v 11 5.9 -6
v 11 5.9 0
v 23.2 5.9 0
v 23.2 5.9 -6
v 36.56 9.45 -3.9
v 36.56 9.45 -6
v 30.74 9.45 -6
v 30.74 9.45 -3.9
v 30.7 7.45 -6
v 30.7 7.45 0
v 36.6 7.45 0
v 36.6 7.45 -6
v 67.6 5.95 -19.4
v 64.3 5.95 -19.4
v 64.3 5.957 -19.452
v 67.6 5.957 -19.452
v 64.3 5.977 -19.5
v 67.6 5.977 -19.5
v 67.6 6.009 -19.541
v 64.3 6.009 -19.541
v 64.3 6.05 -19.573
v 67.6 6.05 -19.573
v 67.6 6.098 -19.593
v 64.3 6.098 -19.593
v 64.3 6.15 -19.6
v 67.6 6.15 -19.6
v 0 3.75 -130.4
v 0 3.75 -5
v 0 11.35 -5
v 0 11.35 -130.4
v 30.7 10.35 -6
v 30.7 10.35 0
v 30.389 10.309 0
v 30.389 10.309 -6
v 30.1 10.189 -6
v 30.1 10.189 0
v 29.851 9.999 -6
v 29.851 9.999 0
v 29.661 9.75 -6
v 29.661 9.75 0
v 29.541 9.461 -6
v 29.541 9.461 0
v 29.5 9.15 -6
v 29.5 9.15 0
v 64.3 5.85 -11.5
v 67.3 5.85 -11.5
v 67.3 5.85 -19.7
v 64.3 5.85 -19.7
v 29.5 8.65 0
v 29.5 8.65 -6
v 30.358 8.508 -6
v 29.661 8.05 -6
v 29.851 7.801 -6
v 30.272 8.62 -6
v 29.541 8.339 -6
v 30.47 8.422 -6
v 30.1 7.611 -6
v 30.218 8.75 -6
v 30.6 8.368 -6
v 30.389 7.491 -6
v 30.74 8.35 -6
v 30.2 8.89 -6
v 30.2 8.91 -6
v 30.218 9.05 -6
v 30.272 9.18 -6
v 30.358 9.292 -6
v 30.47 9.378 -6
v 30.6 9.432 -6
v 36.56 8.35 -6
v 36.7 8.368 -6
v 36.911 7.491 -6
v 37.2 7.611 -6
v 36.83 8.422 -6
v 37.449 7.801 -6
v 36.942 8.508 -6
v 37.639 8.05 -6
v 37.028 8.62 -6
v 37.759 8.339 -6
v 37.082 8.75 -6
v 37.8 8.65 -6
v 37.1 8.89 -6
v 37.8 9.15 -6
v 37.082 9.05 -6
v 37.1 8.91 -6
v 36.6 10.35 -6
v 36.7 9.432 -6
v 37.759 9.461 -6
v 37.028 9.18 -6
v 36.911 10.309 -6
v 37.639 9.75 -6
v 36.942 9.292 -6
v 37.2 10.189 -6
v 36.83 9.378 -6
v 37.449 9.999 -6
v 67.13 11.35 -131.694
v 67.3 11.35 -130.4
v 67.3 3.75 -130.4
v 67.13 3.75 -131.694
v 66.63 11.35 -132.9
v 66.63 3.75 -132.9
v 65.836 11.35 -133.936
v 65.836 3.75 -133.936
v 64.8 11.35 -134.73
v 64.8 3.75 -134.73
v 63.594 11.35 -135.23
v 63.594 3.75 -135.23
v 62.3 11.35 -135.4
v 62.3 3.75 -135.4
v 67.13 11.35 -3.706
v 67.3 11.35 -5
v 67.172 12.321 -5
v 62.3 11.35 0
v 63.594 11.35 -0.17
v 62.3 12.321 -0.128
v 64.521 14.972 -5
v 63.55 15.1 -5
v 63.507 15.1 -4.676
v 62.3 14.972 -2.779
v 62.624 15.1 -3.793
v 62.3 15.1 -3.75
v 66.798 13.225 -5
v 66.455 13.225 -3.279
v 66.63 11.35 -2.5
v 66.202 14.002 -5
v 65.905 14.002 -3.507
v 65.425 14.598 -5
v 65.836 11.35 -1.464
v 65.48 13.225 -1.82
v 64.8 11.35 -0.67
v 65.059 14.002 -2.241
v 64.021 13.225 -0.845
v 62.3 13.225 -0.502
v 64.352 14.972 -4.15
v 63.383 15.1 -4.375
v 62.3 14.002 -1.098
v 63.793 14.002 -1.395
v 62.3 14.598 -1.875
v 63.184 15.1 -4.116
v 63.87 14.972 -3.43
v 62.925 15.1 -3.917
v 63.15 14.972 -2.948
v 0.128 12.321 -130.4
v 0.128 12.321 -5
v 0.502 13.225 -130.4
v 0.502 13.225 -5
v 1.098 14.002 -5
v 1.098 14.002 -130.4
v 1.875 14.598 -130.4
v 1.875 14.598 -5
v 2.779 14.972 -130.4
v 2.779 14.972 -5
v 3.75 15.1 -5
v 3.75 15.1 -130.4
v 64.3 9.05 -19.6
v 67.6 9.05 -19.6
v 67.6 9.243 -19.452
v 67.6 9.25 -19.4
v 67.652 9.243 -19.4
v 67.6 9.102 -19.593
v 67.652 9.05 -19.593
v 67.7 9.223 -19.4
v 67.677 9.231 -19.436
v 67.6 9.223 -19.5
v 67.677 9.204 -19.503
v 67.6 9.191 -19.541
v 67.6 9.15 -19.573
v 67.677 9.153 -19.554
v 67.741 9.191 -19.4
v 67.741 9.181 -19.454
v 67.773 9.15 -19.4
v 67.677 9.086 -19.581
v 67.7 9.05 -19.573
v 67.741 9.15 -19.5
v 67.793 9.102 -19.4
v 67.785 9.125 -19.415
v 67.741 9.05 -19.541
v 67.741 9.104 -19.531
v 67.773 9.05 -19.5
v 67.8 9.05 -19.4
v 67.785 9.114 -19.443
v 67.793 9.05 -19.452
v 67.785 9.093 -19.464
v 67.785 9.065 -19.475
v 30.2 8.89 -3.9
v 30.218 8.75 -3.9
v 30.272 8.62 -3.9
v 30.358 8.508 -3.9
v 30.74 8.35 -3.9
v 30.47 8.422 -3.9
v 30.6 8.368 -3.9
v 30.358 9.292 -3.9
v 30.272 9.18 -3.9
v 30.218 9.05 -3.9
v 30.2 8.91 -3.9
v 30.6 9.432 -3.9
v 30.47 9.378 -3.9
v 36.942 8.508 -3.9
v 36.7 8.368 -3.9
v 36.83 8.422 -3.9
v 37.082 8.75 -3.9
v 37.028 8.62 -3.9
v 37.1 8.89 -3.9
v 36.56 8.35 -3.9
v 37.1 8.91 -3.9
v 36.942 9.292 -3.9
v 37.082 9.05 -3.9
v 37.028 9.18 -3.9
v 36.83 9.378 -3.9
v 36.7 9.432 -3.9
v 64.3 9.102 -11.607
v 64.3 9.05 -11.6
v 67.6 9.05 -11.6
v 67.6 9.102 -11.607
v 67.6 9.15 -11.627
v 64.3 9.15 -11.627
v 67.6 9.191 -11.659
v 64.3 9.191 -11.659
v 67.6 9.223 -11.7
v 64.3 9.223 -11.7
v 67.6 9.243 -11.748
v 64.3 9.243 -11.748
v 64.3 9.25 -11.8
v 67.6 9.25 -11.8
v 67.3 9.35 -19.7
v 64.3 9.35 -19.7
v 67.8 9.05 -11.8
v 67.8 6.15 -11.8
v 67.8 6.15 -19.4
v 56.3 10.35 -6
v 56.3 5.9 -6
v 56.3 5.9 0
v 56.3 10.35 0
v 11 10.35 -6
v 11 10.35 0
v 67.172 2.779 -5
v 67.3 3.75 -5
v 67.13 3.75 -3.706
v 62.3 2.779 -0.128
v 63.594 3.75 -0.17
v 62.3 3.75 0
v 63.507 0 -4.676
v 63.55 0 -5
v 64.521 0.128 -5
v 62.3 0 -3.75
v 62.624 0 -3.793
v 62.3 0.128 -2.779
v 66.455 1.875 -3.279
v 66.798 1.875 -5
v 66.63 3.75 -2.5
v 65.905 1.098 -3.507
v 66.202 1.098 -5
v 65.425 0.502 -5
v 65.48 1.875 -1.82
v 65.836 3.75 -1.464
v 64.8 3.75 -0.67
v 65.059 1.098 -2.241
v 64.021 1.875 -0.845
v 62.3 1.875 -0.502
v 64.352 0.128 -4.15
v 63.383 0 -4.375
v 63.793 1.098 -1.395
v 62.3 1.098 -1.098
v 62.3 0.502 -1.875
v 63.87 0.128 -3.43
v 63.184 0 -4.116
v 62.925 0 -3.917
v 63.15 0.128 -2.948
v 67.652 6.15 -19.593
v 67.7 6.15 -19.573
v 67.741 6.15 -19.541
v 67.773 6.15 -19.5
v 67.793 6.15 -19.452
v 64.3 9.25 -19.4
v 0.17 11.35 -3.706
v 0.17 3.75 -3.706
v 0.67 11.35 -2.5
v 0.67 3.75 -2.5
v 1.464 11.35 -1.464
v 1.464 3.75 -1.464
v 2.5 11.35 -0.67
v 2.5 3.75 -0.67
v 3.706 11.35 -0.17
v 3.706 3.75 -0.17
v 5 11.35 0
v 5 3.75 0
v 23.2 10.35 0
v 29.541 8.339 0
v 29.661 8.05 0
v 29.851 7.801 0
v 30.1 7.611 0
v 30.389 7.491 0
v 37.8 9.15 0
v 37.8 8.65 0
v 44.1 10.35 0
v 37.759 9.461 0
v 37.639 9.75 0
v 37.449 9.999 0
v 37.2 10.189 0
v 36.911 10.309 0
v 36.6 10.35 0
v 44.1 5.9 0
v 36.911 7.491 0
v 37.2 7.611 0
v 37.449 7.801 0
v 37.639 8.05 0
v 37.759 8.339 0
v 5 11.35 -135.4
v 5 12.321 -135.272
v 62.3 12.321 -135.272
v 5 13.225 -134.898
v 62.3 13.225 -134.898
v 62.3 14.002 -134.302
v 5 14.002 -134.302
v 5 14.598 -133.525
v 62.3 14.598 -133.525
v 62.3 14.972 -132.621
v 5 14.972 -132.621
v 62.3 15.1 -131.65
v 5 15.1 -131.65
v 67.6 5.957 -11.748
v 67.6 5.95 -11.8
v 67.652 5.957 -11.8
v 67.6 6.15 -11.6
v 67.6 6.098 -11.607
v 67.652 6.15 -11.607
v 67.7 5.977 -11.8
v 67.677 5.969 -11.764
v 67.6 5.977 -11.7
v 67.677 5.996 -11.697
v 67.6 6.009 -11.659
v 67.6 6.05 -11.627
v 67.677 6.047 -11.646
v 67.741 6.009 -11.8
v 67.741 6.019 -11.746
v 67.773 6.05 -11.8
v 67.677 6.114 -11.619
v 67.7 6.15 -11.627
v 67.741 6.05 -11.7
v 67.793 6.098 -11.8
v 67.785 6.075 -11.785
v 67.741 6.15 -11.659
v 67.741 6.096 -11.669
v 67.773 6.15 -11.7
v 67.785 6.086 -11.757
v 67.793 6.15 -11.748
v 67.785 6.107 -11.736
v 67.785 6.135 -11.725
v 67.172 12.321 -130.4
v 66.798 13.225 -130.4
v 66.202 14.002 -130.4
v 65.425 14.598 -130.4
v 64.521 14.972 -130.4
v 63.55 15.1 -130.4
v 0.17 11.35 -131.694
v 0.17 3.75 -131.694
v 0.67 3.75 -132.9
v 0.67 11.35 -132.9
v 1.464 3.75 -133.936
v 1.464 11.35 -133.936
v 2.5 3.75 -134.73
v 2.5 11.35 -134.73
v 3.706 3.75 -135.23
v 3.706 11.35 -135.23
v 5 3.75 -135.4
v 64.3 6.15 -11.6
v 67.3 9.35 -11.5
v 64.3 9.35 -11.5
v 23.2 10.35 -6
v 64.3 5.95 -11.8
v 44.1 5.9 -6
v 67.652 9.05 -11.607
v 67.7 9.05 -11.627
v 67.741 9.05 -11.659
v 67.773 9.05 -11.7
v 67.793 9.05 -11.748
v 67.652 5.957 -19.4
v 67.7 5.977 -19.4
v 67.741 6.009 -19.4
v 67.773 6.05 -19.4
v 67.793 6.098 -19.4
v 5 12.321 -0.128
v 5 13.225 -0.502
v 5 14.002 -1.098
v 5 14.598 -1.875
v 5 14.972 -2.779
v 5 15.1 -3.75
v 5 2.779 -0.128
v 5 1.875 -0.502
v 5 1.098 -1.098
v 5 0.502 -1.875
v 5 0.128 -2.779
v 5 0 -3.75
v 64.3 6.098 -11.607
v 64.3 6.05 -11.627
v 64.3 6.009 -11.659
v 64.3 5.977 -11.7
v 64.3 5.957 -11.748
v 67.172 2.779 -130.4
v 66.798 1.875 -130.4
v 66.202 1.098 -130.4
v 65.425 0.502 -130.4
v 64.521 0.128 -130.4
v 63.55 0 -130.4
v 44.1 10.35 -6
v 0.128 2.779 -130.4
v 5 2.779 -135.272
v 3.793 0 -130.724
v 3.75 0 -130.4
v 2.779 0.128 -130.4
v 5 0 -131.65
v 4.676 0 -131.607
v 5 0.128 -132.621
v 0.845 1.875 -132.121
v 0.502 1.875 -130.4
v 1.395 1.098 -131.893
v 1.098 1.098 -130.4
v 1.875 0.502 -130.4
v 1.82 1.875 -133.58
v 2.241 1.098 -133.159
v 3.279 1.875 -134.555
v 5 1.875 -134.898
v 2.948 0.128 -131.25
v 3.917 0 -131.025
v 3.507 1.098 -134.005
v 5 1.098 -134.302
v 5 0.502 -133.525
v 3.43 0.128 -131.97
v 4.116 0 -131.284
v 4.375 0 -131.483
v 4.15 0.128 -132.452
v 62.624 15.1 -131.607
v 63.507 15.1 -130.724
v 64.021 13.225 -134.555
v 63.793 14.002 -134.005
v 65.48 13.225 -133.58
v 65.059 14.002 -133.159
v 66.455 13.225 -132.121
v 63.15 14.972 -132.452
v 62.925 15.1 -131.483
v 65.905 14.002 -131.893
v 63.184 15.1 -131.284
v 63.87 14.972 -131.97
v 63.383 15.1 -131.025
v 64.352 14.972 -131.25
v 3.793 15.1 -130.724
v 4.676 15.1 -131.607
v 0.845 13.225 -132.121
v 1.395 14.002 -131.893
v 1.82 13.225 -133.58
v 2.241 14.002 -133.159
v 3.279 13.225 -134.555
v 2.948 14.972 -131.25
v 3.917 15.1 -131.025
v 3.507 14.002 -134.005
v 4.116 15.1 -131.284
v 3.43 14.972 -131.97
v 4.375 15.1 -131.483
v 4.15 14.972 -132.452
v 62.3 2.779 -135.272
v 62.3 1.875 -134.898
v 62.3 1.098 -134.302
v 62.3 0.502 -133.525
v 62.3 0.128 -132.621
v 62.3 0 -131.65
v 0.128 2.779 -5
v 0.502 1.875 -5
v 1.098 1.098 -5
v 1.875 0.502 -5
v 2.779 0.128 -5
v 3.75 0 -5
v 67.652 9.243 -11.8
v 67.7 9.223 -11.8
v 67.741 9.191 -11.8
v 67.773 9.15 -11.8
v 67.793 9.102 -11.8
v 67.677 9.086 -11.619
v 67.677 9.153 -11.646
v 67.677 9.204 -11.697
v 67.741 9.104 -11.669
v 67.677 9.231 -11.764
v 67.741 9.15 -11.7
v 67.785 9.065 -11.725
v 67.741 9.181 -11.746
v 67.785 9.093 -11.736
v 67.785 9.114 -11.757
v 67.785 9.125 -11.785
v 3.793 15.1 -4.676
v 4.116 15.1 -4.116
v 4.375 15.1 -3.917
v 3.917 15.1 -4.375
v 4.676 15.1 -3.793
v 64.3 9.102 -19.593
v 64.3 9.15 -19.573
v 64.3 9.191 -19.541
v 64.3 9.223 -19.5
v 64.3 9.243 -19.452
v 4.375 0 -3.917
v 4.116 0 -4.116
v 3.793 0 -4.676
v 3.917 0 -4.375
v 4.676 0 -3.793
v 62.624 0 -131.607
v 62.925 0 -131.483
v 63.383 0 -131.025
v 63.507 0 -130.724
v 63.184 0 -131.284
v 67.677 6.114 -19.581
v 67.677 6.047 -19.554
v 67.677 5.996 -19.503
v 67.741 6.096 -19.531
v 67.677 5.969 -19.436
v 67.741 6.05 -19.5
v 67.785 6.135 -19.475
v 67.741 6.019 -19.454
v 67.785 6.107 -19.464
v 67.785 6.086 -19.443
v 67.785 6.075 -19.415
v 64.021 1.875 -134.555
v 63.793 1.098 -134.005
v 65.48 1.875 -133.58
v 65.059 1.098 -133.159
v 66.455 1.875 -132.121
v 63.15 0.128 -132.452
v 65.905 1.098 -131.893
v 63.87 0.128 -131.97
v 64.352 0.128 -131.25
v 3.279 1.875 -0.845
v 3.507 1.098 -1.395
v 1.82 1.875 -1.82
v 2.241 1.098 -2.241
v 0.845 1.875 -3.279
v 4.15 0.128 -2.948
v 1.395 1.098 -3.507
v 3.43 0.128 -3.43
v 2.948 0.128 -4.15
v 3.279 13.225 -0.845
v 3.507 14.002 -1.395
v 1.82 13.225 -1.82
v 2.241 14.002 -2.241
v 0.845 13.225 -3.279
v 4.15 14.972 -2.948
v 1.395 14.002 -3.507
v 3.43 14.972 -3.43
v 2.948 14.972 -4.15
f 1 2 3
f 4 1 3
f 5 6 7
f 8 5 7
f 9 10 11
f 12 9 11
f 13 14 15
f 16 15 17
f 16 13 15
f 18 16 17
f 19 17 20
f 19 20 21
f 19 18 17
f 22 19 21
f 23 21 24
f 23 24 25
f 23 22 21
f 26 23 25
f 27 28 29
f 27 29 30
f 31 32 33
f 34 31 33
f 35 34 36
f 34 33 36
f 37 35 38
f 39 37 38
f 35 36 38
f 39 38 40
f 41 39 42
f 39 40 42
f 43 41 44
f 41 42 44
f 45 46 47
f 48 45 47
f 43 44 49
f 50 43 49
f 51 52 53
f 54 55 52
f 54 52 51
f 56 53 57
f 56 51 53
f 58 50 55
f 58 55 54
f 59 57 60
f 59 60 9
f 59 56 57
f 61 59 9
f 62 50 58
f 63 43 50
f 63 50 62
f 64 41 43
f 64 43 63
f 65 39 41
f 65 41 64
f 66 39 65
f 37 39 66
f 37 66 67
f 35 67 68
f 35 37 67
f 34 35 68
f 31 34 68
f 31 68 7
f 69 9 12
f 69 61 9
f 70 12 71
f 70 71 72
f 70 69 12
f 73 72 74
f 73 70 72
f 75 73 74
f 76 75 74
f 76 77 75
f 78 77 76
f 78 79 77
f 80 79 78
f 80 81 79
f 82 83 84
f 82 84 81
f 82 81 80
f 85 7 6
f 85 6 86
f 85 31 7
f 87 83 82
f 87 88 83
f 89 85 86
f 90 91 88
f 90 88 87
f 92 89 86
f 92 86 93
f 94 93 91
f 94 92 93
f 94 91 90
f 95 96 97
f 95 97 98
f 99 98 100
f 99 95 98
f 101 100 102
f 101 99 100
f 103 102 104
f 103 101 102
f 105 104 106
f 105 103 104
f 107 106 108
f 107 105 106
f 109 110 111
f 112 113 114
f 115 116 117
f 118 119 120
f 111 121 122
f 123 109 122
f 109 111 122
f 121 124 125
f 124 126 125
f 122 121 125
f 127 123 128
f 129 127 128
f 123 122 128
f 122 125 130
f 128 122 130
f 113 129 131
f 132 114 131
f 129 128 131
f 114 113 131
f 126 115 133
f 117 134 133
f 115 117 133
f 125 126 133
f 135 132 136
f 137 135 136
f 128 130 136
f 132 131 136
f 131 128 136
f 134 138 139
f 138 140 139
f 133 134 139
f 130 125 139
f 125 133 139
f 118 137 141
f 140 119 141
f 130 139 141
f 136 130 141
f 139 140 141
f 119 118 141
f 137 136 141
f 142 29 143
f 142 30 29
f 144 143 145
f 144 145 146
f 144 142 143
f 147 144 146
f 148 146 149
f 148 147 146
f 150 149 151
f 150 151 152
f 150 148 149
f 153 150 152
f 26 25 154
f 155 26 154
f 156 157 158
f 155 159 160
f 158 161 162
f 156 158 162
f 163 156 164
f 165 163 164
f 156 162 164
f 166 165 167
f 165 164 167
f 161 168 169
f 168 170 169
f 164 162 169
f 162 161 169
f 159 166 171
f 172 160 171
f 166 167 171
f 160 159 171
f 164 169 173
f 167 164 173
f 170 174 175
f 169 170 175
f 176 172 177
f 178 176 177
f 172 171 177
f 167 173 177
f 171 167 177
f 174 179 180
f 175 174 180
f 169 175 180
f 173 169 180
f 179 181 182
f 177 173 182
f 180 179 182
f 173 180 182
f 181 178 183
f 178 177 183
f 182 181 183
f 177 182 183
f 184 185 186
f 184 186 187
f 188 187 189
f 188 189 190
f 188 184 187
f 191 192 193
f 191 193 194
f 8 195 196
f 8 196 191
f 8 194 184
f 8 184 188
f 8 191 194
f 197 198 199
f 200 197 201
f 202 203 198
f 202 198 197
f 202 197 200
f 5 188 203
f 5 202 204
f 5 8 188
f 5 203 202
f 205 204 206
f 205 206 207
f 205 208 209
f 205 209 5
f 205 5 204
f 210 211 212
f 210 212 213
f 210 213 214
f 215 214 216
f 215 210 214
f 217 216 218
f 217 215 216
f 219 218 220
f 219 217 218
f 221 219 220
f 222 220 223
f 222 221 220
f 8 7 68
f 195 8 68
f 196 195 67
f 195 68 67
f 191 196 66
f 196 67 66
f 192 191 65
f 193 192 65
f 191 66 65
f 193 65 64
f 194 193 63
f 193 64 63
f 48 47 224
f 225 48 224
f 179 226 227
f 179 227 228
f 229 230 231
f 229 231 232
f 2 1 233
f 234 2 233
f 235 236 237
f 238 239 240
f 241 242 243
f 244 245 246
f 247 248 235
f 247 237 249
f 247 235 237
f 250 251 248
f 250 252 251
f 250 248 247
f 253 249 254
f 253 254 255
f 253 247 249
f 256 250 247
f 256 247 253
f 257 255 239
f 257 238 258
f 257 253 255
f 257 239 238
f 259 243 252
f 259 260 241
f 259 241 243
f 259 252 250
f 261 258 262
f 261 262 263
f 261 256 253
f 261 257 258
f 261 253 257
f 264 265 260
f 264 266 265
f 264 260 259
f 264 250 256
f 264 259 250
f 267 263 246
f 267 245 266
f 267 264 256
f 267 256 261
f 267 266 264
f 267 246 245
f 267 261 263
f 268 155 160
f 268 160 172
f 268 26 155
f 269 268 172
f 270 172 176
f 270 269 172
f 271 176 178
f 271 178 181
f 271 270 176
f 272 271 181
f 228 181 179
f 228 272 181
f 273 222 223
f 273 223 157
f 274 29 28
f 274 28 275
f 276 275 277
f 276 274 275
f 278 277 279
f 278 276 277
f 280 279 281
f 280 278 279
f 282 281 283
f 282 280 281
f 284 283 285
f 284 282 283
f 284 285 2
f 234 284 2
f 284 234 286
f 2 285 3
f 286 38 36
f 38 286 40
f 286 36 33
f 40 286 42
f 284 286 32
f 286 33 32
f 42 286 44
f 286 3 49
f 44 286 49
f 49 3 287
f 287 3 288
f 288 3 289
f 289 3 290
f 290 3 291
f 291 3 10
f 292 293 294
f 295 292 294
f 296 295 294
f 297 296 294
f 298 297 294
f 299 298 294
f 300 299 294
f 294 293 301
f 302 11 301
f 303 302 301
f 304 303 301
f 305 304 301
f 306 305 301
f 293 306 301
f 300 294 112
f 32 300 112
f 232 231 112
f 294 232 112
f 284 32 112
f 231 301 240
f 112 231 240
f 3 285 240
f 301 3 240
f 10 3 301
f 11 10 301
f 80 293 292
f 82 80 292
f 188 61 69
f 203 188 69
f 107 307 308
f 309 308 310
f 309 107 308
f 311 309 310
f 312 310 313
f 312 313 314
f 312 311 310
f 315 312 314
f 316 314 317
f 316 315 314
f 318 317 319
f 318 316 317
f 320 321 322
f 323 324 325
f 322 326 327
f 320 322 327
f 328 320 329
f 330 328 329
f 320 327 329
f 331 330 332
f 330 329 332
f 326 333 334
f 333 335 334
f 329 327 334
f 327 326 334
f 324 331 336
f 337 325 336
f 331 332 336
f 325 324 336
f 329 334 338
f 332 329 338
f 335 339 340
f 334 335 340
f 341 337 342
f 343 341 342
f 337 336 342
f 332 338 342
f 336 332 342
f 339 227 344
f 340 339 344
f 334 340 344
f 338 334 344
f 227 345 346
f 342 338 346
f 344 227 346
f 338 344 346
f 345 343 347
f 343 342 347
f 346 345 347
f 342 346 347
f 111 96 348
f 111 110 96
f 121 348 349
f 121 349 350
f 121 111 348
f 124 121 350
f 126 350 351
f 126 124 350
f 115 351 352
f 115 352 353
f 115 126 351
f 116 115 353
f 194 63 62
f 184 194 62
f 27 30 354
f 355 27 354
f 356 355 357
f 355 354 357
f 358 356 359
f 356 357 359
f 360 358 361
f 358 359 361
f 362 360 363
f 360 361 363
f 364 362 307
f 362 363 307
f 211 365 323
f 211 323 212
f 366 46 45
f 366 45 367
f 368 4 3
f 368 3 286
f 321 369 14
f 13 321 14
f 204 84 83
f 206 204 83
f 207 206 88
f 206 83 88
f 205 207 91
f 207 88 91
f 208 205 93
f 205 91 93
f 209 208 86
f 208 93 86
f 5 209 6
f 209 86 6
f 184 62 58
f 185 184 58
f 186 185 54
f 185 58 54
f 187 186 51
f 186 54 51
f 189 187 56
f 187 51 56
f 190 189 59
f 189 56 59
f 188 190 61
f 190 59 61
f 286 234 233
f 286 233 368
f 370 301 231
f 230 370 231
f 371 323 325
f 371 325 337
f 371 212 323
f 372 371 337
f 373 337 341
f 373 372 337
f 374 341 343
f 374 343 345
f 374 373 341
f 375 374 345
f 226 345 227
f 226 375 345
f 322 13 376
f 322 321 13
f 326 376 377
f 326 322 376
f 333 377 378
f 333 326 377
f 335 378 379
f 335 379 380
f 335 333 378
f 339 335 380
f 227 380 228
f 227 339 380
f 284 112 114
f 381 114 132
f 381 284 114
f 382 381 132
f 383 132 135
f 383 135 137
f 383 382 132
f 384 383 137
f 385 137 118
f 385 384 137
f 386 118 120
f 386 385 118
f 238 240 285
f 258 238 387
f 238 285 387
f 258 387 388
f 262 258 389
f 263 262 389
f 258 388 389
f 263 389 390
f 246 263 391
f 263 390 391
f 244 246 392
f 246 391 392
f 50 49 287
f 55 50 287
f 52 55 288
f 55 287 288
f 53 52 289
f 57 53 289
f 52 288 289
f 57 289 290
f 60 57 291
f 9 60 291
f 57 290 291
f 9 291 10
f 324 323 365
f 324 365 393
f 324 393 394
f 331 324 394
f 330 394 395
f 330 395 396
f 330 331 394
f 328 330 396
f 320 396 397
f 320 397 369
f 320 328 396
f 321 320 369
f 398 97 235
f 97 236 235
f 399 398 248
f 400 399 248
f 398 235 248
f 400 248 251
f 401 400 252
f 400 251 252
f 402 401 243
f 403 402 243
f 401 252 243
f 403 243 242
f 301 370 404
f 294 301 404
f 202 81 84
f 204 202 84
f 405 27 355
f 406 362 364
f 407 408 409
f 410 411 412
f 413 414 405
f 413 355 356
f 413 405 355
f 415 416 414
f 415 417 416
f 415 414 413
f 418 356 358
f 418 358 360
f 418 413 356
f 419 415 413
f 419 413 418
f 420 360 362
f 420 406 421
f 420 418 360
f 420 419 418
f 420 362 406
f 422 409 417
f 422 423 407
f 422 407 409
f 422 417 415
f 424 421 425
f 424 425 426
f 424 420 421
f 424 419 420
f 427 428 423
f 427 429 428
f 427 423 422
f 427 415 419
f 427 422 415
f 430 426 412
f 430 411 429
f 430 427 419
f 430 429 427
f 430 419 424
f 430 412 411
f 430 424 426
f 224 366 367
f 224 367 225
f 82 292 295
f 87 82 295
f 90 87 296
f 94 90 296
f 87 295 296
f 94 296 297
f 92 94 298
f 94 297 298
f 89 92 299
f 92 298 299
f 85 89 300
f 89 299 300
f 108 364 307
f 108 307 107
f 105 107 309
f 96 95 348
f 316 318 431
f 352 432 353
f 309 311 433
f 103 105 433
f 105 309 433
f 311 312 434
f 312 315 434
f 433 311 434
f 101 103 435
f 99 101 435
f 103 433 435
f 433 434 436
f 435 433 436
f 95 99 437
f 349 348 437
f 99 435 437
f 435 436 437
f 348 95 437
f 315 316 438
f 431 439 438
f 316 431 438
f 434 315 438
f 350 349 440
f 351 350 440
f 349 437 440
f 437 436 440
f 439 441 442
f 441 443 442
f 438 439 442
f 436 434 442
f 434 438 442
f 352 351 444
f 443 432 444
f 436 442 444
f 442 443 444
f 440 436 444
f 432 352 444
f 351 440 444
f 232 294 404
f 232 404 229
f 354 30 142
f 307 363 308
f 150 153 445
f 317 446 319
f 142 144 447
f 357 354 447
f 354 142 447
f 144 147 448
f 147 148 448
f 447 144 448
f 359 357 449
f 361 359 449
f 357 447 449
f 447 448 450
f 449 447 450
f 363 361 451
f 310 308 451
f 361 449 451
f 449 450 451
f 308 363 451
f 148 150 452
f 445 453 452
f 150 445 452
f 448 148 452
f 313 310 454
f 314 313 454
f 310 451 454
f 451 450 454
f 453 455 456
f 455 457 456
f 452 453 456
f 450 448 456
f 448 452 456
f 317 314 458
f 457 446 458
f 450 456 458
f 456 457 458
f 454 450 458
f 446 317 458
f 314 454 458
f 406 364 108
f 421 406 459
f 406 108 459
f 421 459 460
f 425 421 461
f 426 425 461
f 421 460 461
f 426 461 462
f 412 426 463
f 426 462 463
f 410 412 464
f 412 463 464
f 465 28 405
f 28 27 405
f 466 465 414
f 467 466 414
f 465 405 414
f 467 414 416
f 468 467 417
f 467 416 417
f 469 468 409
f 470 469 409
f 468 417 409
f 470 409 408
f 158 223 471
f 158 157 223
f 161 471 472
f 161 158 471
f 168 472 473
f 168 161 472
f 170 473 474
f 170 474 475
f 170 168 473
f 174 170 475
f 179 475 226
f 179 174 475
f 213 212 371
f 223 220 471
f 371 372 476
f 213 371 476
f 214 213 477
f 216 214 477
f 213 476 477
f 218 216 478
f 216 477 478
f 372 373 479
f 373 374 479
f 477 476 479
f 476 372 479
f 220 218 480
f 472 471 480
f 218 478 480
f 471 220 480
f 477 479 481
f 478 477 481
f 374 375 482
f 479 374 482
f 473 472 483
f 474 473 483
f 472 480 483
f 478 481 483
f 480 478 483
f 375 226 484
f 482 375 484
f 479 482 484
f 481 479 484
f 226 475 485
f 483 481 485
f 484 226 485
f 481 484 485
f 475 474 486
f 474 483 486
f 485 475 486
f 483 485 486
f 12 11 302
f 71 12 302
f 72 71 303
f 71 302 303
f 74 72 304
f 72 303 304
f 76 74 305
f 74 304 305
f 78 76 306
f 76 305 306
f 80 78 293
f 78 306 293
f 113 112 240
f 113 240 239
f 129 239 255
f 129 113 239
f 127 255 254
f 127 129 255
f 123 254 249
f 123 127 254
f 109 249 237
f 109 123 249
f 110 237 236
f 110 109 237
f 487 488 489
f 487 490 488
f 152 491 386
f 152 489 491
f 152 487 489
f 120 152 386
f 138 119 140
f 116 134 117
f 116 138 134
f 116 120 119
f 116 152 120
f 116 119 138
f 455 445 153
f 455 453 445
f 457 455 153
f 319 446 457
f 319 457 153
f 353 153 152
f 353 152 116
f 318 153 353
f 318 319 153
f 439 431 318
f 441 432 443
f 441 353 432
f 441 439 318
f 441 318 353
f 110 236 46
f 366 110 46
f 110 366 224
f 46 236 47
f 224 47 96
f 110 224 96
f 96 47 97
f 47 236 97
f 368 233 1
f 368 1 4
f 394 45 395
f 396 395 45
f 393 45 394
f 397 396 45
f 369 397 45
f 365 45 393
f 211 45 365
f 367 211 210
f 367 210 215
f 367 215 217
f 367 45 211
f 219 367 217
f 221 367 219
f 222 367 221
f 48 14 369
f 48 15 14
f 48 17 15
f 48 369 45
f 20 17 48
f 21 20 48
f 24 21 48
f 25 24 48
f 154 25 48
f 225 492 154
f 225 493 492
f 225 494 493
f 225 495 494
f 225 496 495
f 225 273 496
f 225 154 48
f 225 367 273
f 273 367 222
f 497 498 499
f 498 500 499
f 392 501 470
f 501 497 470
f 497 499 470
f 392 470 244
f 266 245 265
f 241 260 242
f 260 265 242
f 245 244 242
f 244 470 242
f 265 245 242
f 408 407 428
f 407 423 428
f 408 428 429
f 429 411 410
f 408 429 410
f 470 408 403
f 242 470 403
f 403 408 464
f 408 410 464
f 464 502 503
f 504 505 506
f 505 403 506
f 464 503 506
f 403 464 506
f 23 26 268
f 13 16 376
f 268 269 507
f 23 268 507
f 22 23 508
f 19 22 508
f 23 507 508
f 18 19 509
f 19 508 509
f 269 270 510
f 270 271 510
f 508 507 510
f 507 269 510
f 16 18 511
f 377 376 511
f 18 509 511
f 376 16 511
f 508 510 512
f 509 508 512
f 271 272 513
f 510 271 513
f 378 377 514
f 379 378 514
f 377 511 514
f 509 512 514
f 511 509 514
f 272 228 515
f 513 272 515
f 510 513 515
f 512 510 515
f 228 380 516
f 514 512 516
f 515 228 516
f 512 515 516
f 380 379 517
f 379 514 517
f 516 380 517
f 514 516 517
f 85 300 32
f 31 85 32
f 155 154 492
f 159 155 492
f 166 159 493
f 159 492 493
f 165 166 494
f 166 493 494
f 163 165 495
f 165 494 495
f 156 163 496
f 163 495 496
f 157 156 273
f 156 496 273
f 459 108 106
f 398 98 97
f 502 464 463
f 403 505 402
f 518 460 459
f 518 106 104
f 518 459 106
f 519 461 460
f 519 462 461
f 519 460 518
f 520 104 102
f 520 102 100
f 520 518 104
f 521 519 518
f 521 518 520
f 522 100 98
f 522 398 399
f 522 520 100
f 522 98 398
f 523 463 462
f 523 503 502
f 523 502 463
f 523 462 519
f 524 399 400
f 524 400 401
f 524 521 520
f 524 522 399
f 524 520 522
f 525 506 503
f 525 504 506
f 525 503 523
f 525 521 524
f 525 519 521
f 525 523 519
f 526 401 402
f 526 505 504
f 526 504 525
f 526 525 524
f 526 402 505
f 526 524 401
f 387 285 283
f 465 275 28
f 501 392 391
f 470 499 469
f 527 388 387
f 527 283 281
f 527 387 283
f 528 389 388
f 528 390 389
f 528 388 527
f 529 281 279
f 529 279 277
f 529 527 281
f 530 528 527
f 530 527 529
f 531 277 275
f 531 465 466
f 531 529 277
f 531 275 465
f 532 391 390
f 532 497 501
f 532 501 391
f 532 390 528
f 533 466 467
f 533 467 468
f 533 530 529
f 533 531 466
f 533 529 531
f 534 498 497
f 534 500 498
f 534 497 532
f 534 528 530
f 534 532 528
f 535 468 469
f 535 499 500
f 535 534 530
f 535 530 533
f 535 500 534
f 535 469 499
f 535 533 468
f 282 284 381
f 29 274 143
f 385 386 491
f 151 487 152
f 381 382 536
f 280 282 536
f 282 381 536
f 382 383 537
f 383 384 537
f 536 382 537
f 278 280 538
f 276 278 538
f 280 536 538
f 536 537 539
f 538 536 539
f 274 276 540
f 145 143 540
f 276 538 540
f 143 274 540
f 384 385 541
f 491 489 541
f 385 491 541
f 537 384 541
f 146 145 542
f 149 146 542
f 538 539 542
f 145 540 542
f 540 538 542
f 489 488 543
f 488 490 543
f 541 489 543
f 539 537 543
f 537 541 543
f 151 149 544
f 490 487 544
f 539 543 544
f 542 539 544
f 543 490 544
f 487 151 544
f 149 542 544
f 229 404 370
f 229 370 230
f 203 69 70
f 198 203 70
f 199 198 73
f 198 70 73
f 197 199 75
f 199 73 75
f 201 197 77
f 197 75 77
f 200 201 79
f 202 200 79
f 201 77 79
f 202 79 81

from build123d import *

# Parameters (mm, degrees)
SKETCH1_W           = 67.3
SKETCH1_H           = 135.4
BOSS_EXTRUDE1_DEPTH = 15.1
FILLET1_R           = 5
FILLET2_R           = 3.75
SKETCH2_W           = 12.2
SKETCH2_H           = 4.45
CUT_EXTRUDE1_DEPTH  = 6
SKETCH3_W           = 8.2
SKETCH3_H           = 3.5
SKETCH3_W_2         = 8
SKETCH3_H_2         = 3.3
CUT_EXTRUDE2_DEPTH  = 3
FILLET3_R           = 3.75
SKETCH4_W           = 8
SKETCH4_H           = 3.3
BOSS_EXTRUDE2_DEPTH = 0.5
FILLET4_R           = 0.2
FILLET5_R           = 0.2
BOSS_EXTRUDE3_DEPTH = 2.1


with BuildPart() as part:
    # Sketch1 → Boss-Extrude1 (new body)
    with BuildSketch(Plane(origin=(0, 0, 0), x_dir=(1, 0, 0), z_dir=(0, 1, 0))):
        with Locations((33.65, 67.7)):
            Rectangle(SKETCH1_W, SKETCH1_H)
    extrude(amount=BOSS_EXTRUDE1_DEPTH)

    # Fillet1
    fillet1_edges = [part.edges().sort_by_distance(p)[0] for p in [
        (0, 7.55, -135.4),
        (67.3, 7.55, -135.4),
        (67.3, 7.55, 0),
        (0, 7.55, 0),
    ]]
    fillet(fillet1_edges, radius=FILLET1_R)

    # Fillet2
    fillet2_edges = [part.edges().sort_by_distance(p)[0] for p in [
        (0, 15.1, -67.7),
        (33.65, 15.1, -135.4),
        (33.65, 15.1, 0),
        (67.3, 15.1, -67.7),
        (1.464466094, 15.1, -1.464466094),
        (65.835533906, 15.1, -1.464466094),
        (65.835533906, 15.1, -133.935533906),
        (1.464466094, 15.1, -133.935533906),
    ]]
    fillet(fillet2_edges, radius=FILLET2_R)

    # Sketch2 → Cut-Extrude1 (cut)
    with BuildSketch(Plane.XY):
        with Locations((17.1, 8.125)):
            Rectangle(SKETCH2_W, SKETCH2_H)
        with Locations((50.2, 8.125)):
            Rectangle(SKETCH2_W, SKETCH2_H)
        with BuildLine():
            Line((30.7, 7.45), (36.6, 7.45))
            ThreePointArc((36.6, 7.45), (37.448528137, 7.801471863), (37.8, 8.65))
            Line((37.8, 8.65), (37.8, 9.15))
            ThreePointArc((37.8, 9.15), (37.448528137, 9.998528137), (36.6, 10.35))
            Line((36.6, 10.35), (30.7, 10.35))
            ThreePointArc((30.7, 10.35), (29.851471863, 9.998528137), (29.5, 9.15))
            Line((29.5, 9.15), (29.5, 8.65))
            ThreePointArc((29.5, 8.65), (29.851471863, 7.801471863), (30.7, 7.45))
        make_face()
    extrude(amount=-CUT_EXTRUDE1_DEPTH, mode=Mode.SUBTRACT)

    # Sketch3 → Cut-Extrude2 (cut)
    with BuildSketch(Plane(origin=(67.3, 0, 0), x_dir=(0, 0, -1), z_dir=(1, 0, 0))):
        with Locations((15.6, 7.6)):
            Rectangle(SKETCH3_W, SKETCH3_H)
        with Locations((15.6, 7.6)):
            Rectangle(SKETCH3_W_2, SKETCH3_H_2, mode=Mode.SUBTRACT)
    extrude(amount=-CUT_EXTRUDE2_DEPTH, mode=Mode.SUBTRACT)

    # Fillet3
    fillet3_edges = [part.edges().sort_by_distance(p)[0] for p in [
        (0, 0, -67.7),
        (33.65, 0, -135.4),
        (67.3, 0, -67.7),
        (33.65, 0, 0),
        (1.464466094, 0, -1.464466094),
        (65.835533906, 0, -1.464466094),
        (65.835533906, 0, -133.935533906),
        (1.464466094, 0, -133.935533906),
    ]]
    fillet(fillet3_edges, radius=FILLET3_R)

    # Sketch4 → Boss-Extrude2 (add)
    with BuildSketch(Plane(origin=(67.3, 0, 0), x_dir=(0, 0, -1), z_dir=(1, 0, 0))):
        with Locations((15.6, 7.6)):
            Rectangle(SKETCH4_W, SKETCH4_H)
    extrude(amount=BOSS_EXTRUDE2_DEPTH)

    # Fillet4
    fillet4_edges = [part.edges().sort_by_distance(p)[0] for p in [
        (66.05, 9.25, -11.6),
        (66.05, 9.25, -19.6),
        (66.05, 5.95, -19.6),
        (66.05, 5.95, -11.6),
    ]]
    fillet(fillet4_edges, radius=FILLET4_R)

    # Fillet5
    fillet5_edges = [part.edges().sort_by_distance(p)[0] for p in [
        (67.8, 7.6, -11.6),
        (67.8, 5.95, -15.6),
        (67.8, 7.6, -19.6),
        (67.8, 9.25, -15.6),
        (67.8, 9.191421356, -11.658578644),
        (67.8, 9.191421356, -19.541421356),
        (67.8, 6.008578644, -19.541421356),
        (67.8, 6.008578644, -11.658578644),
    ]]
    fillet(fillet5_edges, radius=FILLET5_R)

    # Sketch5 → Boss-Extrude3 (add)
    with BuildSketch(Plane.XY.offset(-6)):
        with BuildLine():
            Line((30.74, 8.35), (36.56, 8.35))
            ThreePointArc((36.56, 8.35), (36.941837662, 8.508162338), (37.1, 8.89))
            Line((37.1, 8.89), (37.1, 8.91))
            ThreePointArc((37.1, 8.91), (36.941837662, 9.291837662), (36.56, 9.45))
            Line((36.56, 9.45), (30.74, 9.45))
            ThreePointArc((30.74, 9.45), (30.358162338, 9.291837662), (30.2, 8.91))
            Line((30.2, 8.91), (30.2, 8.89))
            ThreePointArc((30.2, 8.89), (30.358162338, 8.508162338), (30.74, 8.35))
        make_face()
    extrude(amount=BOSS_EXTRUDE3_DEPTH)


solid = part.part
